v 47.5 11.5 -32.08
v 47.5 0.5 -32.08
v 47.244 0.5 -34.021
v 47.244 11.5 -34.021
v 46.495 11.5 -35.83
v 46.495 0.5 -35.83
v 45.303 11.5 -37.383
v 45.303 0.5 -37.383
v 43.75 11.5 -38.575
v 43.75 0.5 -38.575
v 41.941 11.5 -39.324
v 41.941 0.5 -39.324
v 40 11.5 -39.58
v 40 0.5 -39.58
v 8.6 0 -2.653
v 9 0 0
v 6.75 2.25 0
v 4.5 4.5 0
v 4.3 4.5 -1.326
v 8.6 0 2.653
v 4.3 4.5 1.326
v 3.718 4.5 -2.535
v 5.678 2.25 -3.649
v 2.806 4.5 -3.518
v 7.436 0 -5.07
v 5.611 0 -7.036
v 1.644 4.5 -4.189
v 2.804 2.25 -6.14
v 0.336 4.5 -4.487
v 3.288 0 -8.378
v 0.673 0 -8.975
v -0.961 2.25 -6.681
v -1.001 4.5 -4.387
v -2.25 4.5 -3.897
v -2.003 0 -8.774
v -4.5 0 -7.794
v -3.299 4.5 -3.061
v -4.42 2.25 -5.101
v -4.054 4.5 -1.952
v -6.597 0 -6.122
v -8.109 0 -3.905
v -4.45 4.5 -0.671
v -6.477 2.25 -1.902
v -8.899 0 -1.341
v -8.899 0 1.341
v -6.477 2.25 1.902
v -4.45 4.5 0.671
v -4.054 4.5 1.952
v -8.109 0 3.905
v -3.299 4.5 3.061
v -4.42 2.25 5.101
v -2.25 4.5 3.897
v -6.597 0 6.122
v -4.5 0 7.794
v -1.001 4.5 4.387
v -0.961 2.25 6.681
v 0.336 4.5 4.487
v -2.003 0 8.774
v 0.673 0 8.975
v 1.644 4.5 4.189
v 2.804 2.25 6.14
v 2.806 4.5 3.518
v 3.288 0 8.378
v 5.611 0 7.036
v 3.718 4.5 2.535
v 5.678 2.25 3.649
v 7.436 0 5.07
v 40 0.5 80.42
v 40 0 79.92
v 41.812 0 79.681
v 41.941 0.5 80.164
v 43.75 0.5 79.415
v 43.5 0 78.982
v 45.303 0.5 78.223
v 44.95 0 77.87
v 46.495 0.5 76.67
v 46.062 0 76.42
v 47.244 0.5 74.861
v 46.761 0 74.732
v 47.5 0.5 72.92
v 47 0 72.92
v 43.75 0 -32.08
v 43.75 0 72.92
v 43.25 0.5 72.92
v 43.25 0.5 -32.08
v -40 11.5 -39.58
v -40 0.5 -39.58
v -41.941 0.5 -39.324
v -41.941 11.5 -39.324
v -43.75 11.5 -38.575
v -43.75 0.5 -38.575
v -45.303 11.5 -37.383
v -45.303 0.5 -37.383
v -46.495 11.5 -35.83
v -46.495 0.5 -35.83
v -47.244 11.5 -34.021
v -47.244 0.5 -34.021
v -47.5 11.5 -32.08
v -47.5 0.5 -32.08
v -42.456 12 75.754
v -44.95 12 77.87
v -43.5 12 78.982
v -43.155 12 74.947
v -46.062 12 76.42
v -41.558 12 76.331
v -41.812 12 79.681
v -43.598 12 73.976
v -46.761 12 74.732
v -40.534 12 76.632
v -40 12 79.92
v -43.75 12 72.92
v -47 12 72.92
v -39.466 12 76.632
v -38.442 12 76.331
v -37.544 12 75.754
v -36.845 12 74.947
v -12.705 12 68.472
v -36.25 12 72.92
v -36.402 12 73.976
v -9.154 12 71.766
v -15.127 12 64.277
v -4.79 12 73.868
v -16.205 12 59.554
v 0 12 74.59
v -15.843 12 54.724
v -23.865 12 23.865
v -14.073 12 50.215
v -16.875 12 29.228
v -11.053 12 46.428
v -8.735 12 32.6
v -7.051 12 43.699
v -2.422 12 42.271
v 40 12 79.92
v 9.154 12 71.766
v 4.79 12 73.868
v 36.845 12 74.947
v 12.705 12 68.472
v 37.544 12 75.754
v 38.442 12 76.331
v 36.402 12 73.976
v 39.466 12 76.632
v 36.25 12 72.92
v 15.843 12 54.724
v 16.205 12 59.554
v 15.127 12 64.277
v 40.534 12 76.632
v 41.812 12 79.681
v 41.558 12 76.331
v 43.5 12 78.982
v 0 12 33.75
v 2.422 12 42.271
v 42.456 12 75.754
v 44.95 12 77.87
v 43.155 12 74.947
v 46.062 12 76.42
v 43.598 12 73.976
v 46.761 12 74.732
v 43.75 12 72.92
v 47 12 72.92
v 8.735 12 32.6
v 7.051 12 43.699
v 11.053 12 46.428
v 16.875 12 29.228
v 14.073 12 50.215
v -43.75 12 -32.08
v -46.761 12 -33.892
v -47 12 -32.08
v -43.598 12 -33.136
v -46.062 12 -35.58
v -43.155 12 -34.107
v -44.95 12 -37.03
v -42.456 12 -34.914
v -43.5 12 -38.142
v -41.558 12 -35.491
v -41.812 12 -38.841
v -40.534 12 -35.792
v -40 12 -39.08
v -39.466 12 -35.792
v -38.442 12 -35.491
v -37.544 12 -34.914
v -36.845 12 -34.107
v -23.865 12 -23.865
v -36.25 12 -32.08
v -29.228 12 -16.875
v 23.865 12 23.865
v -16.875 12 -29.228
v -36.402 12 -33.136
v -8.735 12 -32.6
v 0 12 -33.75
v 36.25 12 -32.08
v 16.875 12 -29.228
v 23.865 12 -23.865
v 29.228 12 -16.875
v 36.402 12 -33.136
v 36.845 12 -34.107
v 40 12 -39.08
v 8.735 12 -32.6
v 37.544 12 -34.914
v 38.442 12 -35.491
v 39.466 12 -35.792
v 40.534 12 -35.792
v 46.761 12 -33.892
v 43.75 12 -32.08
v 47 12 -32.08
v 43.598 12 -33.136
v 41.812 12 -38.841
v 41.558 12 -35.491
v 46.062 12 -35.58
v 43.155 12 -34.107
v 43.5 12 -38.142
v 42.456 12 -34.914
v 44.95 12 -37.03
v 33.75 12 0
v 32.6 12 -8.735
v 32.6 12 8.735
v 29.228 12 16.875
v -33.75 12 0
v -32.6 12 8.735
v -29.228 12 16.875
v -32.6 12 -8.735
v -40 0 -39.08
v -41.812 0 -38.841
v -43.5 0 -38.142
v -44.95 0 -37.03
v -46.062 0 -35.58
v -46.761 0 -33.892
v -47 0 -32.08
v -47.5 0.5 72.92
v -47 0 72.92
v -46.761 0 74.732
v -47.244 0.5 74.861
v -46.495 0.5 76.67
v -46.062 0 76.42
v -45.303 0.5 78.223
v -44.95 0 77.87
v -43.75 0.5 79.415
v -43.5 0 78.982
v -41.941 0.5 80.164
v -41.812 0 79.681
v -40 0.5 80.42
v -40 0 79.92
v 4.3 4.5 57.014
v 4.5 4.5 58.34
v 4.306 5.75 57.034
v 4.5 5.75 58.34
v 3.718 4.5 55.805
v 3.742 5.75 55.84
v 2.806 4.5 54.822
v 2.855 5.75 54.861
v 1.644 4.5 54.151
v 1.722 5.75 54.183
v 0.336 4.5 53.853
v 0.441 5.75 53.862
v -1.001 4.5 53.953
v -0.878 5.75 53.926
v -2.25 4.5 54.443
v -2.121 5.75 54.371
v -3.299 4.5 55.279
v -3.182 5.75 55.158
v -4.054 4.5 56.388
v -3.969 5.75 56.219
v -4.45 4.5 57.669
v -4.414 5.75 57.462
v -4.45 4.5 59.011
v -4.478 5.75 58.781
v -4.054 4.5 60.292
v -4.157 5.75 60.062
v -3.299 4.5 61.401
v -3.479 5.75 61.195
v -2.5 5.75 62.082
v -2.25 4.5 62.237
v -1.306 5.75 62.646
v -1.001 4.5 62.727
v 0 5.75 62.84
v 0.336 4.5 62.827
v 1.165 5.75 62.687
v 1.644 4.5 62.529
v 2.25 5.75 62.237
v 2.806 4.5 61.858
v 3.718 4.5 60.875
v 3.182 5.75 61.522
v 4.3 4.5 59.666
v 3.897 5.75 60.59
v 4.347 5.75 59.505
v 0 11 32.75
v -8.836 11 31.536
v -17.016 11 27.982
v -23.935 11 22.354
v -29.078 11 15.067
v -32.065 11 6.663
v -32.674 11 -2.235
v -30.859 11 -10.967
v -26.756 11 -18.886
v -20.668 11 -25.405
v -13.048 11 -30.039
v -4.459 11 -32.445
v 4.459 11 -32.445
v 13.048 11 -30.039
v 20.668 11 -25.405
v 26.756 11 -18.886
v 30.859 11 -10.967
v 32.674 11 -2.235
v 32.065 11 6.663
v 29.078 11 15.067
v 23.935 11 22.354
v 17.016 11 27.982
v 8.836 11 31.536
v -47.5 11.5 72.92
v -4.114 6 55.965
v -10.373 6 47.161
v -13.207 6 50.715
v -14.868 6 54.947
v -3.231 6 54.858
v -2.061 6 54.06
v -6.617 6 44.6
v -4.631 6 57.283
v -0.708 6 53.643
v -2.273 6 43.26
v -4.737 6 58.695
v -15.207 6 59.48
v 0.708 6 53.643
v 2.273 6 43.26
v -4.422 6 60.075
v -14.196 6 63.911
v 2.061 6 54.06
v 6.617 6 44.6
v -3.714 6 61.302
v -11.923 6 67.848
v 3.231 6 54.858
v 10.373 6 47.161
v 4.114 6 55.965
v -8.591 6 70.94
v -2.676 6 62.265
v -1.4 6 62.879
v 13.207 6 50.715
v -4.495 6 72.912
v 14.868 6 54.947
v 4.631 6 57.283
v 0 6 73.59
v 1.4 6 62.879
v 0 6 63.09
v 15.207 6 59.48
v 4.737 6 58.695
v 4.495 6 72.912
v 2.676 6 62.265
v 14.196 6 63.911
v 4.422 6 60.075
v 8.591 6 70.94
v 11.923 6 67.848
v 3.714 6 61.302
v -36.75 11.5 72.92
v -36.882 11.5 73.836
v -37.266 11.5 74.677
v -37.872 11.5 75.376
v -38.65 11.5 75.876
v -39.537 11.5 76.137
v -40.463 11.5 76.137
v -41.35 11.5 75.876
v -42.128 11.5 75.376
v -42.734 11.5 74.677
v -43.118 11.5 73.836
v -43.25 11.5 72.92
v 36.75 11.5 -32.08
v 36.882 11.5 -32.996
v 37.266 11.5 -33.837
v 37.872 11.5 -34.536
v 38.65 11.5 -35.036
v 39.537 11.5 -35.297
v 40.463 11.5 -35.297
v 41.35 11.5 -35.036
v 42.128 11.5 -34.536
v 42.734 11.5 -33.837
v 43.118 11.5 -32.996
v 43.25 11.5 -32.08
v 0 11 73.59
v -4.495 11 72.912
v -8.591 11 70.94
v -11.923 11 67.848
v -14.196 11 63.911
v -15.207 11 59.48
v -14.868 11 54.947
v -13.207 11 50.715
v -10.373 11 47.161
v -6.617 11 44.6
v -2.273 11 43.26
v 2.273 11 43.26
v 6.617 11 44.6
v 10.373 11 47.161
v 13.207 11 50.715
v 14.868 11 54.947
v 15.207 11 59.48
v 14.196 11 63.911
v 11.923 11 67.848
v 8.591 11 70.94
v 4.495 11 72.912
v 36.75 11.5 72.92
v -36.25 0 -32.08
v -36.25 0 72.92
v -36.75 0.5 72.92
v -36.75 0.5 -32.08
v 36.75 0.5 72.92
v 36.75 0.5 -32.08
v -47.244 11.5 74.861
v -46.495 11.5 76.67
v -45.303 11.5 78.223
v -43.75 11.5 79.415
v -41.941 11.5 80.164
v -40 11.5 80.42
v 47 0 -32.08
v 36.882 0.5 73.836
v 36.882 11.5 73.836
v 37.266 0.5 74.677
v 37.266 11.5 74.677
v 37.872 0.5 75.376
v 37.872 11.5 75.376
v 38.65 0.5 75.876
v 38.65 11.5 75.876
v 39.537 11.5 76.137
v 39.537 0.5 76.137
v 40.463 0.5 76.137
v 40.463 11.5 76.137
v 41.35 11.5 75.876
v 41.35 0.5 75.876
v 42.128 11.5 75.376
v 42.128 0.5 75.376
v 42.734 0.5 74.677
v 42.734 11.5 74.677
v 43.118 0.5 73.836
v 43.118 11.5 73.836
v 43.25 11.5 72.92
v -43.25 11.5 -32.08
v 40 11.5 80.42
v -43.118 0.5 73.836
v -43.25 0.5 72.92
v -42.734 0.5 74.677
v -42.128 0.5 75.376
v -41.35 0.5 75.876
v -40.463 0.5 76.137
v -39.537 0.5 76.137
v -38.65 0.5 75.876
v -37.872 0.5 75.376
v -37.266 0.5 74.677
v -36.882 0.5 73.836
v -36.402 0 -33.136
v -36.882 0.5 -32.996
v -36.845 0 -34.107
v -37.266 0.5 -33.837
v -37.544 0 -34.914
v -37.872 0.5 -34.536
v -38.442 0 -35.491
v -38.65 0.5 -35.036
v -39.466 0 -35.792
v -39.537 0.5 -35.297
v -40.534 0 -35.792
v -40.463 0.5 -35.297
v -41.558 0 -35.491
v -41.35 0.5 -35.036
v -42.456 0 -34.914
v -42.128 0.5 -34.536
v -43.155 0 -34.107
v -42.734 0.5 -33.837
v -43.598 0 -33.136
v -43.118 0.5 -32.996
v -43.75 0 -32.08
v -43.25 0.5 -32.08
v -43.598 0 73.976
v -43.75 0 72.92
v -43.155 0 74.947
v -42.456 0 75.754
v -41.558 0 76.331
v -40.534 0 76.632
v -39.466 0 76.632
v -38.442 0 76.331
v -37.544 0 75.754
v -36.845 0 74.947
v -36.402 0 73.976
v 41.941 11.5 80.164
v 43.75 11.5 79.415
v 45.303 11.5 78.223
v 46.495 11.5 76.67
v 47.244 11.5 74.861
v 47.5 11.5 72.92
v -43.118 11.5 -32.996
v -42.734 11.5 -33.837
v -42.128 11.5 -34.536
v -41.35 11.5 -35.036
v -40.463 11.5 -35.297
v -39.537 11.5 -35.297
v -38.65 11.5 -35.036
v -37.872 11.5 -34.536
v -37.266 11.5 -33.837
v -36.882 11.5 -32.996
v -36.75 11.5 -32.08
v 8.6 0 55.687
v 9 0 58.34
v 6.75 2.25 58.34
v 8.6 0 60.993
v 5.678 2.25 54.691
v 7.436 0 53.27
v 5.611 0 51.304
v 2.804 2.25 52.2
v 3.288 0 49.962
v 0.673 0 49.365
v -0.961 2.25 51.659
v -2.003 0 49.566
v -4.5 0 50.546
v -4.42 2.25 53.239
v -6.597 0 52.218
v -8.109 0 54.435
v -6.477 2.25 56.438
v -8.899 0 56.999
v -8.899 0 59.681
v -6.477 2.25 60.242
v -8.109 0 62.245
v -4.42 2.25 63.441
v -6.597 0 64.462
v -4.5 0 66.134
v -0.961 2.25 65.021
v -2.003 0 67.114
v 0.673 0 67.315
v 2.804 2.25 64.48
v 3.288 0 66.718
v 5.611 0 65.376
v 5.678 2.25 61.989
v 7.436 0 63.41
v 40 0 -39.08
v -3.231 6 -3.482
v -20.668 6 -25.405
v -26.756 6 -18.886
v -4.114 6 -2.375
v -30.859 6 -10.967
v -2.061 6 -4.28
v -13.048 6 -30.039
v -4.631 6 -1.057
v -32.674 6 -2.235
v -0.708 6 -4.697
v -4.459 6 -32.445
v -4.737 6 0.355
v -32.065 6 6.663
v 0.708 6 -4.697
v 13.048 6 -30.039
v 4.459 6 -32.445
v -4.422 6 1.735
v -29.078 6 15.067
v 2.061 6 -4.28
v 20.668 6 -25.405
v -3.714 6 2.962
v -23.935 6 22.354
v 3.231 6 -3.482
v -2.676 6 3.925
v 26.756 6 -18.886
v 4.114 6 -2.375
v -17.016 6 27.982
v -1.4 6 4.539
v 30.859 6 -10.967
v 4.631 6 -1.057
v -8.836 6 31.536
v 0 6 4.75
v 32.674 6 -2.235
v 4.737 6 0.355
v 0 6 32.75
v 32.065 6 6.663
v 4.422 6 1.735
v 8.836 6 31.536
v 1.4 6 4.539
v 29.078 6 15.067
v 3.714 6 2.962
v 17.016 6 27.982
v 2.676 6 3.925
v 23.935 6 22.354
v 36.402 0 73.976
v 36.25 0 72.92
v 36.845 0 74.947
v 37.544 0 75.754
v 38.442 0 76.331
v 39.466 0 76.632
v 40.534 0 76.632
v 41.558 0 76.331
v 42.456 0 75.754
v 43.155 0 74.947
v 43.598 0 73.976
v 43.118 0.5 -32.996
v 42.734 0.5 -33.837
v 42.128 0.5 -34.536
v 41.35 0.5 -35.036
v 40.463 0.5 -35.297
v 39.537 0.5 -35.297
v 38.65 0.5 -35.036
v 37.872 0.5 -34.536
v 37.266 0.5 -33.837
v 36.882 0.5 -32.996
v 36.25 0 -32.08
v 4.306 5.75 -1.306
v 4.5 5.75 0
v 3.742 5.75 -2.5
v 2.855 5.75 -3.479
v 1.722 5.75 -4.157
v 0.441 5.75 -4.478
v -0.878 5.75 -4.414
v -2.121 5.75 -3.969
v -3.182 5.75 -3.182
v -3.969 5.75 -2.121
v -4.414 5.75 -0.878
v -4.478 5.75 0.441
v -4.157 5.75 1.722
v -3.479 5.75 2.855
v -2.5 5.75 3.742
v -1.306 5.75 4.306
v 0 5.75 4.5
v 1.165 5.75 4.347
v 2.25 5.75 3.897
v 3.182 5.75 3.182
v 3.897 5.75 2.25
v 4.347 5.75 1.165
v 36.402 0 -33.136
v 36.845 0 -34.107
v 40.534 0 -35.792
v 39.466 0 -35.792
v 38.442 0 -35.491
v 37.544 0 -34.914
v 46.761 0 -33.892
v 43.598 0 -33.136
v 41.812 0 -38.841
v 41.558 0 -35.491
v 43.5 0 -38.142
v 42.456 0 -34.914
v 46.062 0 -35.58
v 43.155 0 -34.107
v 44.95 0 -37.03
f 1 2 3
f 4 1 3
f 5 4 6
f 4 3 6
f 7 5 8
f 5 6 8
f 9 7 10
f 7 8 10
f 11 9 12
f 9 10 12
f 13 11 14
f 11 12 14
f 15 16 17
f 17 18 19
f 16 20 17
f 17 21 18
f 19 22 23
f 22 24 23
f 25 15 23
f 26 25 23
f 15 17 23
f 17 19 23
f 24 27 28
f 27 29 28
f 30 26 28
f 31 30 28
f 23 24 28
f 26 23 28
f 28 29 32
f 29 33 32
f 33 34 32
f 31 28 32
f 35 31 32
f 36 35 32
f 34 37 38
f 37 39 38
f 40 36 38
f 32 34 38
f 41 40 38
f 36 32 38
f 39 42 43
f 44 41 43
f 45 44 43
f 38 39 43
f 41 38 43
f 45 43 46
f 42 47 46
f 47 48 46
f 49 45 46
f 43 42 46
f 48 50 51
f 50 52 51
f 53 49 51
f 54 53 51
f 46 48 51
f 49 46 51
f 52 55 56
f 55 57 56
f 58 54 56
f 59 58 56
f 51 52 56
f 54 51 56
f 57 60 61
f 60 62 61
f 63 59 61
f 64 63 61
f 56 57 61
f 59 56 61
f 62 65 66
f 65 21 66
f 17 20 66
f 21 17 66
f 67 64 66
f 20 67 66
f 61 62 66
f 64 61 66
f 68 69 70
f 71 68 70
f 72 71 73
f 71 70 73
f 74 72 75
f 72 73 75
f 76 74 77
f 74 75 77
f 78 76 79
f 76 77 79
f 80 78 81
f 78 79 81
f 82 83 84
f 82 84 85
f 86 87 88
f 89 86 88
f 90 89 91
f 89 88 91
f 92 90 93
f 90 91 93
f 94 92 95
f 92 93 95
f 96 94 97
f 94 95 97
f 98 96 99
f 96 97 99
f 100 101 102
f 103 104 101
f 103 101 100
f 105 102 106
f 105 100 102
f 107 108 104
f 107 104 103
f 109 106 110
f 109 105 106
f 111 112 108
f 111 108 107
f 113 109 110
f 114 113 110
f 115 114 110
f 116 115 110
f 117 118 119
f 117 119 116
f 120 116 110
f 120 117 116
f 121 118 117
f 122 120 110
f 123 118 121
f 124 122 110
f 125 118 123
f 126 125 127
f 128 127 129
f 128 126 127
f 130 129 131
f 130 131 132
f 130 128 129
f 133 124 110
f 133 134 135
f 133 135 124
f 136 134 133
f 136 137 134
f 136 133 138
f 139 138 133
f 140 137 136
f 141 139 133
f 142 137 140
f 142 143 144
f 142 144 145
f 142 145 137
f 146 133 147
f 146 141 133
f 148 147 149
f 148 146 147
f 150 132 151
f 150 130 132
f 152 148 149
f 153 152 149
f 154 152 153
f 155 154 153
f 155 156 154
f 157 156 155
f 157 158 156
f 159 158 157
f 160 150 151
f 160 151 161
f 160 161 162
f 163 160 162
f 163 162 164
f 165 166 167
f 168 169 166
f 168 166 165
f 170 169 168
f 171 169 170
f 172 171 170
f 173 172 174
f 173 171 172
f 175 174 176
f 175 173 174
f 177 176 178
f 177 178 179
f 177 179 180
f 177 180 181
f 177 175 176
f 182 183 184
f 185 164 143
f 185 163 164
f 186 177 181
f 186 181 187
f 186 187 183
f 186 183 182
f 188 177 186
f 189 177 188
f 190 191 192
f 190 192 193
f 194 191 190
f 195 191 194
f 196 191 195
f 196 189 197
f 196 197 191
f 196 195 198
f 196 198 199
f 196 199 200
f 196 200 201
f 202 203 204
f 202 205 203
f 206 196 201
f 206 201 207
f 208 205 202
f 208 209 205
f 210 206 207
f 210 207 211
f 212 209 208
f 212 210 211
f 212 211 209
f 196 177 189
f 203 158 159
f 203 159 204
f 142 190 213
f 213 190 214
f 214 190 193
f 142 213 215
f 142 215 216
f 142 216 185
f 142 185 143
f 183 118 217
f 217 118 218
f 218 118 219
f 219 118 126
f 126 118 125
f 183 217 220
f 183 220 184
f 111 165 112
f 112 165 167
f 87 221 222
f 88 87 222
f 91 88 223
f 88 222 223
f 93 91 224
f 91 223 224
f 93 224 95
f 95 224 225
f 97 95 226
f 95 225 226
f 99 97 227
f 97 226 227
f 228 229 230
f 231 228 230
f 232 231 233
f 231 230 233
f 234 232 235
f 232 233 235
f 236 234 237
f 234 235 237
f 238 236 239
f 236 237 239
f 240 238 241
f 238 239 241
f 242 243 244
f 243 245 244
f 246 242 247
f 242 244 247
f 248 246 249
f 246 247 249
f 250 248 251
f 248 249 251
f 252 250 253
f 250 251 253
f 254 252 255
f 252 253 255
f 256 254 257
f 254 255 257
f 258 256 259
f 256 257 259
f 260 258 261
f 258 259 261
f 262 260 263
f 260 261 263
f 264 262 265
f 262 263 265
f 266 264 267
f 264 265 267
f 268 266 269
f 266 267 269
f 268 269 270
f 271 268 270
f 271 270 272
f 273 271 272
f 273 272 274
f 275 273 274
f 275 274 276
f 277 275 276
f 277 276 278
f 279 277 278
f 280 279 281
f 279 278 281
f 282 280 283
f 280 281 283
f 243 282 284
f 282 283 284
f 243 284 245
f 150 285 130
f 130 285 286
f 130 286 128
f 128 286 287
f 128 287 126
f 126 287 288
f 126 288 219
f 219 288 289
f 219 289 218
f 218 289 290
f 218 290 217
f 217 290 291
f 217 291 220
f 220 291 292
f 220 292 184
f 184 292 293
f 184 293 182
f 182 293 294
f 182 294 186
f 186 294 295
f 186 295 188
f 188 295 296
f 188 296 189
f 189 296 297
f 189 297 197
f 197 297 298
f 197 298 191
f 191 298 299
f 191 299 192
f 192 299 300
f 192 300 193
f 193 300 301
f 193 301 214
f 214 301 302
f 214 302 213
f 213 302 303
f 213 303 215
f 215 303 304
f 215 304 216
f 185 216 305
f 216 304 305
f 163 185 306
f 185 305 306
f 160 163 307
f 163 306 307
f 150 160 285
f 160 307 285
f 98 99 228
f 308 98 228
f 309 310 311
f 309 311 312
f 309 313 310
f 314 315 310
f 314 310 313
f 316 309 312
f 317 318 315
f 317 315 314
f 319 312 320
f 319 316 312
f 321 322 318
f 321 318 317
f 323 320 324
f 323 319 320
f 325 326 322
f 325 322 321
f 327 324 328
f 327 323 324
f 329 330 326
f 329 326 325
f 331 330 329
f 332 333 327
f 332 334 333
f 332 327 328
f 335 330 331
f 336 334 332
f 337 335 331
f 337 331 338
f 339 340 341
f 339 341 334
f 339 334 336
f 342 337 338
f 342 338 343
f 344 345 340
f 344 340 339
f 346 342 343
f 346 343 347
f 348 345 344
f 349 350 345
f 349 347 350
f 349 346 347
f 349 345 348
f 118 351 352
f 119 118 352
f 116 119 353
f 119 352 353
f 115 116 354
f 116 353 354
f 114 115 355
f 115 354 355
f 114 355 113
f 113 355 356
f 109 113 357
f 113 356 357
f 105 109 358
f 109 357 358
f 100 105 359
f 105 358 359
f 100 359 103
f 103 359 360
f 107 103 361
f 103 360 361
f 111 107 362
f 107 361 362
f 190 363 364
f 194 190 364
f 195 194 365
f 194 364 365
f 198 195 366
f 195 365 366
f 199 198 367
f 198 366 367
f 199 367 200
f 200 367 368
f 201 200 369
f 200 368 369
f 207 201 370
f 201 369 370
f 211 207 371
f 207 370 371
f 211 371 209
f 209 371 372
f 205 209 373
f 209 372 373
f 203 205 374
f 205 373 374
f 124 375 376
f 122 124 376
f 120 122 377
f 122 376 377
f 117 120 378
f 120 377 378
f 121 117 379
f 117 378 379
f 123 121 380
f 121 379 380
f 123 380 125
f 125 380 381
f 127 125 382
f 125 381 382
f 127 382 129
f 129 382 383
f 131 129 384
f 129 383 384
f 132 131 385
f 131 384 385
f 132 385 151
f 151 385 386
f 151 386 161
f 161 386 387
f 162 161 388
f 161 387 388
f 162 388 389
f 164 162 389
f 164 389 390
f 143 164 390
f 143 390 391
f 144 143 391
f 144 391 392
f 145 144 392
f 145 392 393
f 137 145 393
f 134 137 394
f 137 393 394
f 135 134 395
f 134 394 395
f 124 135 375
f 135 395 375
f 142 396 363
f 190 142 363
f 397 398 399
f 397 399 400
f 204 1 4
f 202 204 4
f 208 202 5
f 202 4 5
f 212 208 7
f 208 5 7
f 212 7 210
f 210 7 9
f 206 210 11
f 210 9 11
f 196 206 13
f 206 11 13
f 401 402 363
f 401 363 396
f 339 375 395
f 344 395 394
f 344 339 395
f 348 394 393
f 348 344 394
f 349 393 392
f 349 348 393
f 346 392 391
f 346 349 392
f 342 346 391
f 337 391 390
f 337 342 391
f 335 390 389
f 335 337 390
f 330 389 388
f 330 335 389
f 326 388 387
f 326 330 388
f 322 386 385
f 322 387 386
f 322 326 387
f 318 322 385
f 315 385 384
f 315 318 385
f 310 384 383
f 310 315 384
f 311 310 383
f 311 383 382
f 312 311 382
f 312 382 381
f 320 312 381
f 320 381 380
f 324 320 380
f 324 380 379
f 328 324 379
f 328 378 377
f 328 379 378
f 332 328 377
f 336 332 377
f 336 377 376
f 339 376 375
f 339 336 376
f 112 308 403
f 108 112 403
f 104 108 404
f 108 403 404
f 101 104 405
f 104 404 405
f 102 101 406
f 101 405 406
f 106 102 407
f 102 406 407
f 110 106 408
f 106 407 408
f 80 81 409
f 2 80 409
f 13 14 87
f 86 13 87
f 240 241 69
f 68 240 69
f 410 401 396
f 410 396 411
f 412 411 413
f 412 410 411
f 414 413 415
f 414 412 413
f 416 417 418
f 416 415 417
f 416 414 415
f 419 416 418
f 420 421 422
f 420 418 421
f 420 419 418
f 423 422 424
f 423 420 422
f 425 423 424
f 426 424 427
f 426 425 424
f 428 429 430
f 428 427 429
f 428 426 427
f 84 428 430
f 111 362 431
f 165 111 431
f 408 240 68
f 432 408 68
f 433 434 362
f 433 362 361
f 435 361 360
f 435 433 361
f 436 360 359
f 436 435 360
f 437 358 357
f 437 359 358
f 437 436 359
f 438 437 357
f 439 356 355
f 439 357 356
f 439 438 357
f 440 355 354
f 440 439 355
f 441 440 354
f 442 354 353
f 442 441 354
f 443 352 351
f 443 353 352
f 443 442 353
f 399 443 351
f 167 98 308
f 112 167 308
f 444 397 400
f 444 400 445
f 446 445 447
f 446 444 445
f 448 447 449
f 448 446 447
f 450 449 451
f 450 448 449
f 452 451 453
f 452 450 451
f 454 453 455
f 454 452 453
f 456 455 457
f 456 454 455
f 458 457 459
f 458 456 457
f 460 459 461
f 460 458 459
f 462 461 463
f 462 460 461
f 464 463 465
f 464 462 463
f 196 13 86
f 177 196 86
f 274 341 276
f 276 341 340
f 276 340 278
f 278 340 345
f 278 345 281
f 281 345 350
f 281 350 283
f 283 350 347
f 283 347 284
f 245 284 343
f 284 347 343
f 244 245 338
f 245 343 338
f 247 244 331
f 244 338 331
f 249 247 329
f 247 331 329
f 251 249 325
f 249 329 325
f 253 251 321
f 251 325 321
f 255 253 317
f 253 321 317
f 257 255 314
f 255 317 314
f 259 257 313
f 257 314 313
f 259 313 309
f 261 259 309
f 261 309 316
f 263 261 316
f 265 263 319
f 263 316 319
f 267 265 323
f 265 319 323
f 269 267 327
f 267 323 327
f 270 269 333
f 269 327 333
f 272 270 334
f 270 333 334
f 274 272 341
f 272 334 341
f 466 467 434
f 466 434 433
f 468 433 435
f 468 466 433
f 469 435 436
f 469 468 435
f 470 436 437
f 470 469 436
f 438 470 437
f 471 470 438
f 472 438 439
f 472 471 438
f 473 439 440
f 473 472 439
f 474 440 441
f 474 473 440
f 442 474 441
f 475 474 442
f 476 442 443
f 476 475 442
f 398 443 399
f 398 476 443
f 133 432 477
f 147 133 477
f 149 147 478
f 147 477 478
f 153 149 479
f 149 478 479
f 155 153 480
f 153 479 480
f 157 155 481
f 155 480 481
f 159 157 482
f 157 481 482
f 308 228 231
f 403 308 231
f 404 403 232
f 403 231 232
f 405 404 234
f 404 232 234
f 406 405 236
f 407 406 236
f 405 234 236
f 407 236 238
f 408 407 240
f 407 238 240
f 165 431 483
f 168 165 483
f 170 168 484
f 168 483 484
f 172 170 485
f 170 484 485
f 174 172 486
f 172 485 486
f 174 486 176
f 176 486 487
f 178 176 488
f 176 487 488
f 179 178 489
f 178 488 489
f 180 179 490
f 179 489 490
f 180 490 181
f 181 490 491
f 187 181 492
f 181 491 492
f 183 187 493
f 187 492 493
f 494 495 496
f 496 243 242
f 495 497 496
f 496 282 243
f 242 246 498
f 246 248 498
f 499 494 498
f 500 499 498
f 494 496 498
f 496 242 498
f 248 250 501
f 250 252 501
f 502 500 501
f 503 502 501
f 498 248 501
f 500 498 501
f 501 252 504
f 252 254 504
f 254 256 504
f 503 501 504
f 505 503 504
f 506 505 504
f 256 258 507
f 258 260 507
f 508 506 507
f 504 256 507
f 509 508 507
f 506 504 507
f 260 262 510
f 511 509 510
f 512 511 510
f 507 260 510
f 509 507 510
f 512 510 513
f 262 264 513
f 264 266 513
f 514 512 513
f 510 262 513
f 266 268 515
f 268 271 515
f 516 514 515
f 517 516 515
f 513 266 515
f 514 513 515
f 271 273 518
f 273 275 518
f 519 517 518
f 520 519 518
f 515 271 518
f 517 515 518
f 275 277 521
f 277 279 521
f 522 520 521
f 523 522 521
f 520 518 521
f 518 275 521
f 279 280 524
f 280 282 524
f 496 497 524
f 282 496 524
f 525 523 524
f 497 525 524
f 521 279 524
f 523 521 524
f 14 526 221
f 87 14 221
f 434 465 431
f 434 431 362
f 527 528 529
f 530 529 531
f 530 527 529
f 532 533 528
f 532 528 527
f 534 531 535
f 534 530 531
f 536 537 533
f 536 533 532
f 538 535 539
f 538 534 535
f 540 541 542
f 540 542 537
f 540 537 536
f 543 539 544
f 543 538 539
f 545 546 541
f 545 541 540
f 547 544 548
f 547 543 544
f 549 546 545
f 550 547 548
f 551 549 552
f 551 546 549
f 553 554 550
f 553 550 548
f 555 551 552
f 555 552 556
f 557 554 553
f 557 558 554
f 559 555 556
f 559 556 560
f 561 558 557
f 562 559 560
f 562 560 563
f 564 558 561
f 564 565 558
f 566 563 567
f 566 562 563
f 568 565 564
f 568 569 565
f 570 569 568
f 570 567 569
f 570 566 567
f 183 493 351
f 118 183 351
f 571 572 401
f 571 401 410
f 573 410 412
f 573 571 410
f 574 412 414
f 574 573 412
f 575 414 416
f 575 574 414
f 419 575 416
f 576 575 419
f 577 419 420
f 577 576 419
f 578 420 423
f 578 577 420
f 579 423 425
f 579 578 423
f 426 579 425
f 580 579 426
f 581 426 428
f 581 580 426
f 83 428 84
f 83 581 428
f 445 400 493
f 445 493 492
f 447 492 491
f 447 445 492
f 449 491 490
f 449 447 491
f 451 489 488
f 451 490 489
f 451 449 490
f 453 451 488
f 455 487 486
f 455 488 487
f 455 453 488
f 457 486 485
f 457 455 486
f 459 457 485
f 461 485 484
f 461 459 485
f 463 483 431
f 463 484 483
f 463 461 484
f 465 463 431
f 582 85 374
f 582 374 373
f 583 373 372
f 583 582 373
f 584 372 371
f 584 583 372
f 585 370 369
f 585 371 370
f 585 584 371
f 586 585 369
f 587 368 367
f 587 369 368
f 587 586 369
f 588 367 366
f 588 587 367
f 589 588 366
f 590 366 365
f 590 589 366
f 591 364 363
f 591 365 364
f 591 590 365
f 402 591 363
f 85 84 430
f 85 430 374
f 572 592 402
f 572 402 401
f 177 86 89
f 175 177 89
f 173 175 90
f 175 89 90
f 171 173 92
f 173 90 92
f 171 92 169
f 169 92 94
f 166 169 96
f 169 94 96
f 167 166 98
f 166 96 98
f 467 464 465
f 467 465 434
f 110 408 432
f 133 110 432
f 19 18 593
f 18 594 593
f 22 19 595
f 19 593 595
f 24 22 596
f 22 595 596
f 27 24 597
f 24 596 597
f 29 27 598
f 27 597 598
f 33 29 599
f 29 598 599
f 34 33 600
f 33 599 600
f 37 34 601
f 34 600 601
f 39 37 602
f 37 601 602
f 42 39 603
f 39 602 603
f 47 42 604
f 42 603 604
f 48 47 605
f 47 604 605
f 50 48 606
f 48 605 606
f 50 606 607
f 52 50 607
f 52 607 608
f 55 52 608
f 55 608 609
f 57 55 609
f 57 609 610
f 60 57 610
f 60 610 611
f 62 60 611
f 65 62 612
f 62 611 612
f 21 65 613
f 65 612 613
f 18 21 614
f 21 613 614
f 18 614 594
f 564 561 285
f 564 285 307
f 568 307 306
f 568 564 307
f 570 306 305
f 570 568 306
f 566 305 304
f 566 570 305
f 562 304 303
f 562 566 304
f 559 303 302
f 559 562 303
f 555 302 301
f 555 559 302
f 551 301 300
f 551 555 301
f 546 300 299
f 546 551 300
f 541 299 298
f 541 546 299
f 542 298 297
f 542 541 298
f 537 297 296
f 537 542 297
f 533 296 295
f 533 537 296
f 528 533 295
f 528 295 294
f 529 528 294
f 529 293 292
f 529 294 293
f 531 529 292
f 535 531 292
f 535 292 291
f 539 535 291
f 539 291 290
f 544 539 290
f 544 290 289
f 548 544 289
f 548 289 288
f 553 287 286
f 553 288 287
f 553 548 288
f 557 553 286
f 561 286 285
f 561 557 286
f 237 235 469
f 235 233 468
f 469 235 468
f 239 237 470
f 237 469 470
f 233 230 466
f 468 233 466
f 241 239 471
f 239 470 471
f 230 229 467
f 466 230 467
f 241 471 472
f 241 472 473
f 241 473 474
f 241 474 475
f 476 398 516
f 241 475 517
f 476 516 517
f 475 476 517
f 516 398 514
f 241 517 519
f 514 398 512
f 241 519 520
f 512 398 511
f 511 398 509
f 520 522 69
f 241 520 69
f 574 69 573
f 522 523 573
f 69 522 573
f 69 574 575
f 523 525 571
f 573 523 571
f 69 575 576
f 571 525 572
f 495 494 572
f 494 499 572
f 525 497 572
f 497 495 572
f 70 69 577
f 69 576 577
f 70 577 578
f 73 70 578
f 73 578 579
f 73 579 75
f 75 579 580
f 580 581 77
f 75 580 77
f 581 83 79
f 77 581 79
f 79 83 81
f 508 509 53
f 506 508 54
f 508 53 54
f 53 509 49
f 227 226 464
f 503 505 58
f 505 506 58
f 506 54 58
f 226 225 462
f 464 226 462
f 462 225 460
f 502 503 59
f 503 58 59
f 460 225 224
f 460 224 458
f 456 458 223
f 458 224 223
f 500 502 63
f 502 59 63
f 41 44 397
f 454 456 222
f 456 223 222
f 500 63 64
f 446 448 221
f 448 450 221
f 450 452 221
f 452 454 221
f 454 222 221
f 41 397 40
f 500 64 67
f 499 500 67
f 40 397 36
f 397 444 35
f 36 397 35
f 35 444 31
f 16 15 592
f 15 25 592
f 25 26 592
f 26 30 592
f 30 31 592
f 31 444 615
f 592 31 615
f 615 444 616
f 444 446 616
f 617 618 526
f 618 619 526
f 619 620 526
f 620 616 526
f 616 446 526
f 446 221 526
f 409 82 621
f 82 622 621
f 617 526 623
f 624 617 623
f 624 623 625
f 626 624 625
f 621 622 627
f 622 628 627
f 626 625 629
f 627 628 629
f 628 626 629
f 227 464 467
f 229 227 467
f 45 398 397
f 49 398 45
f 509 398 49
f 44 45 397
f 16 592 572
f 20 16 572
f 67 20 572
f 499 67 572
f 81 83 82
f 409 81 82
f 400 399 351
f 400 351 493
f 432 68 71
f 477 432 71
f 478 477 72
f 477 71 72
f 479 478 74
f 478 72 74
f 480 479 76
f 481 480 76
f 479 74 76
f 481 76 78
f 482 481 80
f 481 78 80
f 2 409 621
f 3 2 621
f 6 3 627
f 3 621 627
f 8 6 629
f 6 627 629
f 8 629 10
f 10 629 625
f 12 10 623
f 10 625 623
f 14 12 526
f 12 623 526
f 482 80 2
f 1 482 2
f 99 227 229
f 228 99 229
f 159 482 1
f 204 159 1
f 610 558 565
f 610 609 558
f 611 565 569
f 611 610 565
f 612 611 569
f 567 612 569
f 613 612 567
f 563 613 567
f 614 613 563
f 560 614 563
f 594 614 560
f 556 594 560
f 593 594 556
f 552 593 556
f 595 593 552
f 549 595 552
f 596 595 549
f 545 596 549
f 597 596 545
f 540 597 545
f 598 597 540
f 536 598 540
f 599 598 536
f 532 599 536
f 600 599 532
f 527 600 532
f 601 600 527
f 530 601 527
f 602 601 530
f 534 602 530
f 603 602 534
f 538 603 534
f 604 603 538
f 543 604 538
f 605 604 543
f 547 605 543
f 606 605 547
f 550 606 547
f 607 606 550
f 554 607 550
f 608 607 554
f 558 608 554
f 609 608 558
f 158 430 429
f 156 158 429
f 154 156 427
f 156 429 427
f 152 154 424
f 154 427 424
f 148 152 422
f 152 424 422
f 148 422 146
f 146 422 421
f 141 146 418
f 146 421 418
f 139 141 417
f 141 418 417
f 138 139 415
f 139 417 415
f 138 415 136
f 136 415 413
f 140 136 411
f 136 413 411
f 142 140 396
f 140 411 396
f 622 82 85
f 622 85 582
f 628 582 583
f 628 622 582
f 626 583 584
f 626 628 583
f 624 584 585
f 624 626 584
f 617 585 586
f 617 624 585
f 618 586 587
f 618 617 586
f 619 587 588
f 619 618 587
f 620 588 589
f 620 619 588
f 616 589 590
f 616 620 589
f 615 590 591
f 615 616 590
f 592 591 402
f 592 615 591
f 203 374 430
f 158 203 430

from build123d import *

# Parameters (mm, degrees)
BOSS_EXTRUDE1_DEPTH                             = 12
SKETCH1_4_R                                     = 4.25
CUT_EXTRUDE2_DEPTH                              = 95.16807527
CUT_EXTRUDE3_START                              = 6
SKETCH1_6_R                                     = 32.75
SKETCH1_6_R_2                                   = 4.25
SKETCH1_6_R_3                                   = 15.25
CUT_EXTRUDE3_DEPTH                              = 89.16807527
CHAMFER1_SIZE                                   = 1
CHAMFER2_SIZE                                   = 0.5
CSK_FOR_M8_FLAT_HEAD_MACHINE_SCREW1_D           = 9
CSK_FOR_M8_FLAT_HEAD_MACHINE_SCREW1_CSINK_D     = 18
CSK_FOR_M8_FLAT_HEAD_MACHINE_SCREW1_CSINK_ANGLE = 90


with BuildPart() as part:
    # Sketch1 → Boss-Extrude1 (new body)
    with BuildSketch(Plane(origin=(0, 0, 0), x_dir=(1, 0, 0), z_dir=(0, 1, 0))):
        with BuildLine():
            ThreePointArc((-47.5, -72.92), (-45.303300859, -78.223300859), (-40, -80.42))
            Line((-40, -80.42), (40, -80.42))
            ThreePointArc((40, -80.42), (45.303300859, -78.223300859), (47.5, -72.92))
            Line((47.5, -72.92), (47.5, 32.08))
            ThreePointArc((47.5, 32.08), (45.303300859, 37.383300859), (40, 39.58))
            Line((40, 39.58), (-40, 39.58))
            ThreePointArc((-40, 39.58), (-45.303300859, 37.383300859), (-47.5, 32.08))
            Line((-47.5, 32.08), (-47.5, -72.92))
        make_face()
    extrude(amount=BOSS_EXTRUDE1_DEPTH)

    # Sketch1<4> → Cut-Extrude2 (cut, through all)
    with BuildSketch(Plane(origin=(0, 0, 0), x_dir=(1, 0, 0), z_dir=(0, 1, 0))):
        with BuildLine():
            Line((-36.75, -72.92), (-36.75, 32.08))
            ThreePointArc((-36.75, 32.08), (-40, 35.33), (-43.25, 32.08))
            Line((-43.25, 32.08), (-43.25, -72.92))
            ThreePointArc((-43.25, -72.92), (-40, -76.17), (-36.75, -72.92))
        make_face()
        with BuildLine():
            Line((43.25, -72.92), (43.25, 32.08))
            ThreePointArc((43.25, 32.08), (40, 35.33), (36.75, 32.08))
            Line((36.75, 32.08), (36.75, -72.92))
            ThreePointArc((36.75, -72.92), (40, -76.17), (43.25, -72.92))
        make_face()
        Circle(SKETCH1_4_R)
        with Locations((0, -58.34)):
            Circle(SKETCH1_4_R)
    extrude(amount=CUT_EXTRUDE2_DEPTH, mode=Mode.SUBTRACT)

    # Sketch1<6> → Cut-Extrude3 (cut, through all)
    # profile 1 of 2: a face of its own
    with BuildSketch(Plane(origin=(0, 0, 0), x_dir=(1, 0, 0), z_dir=(0, 1, 0)).offset(CUT_EXTRUDE3_START)):
        Circle(SKETCH1_6_R)
        Circle(SKETCH1_6_R_2, mode=Mode.SUBTRACT)
    # profile 2 of 2: a face of its own
    with BuildSketch(Plane(origin=(0, 0, 0), x_dir=(1, 0, 0), z_dir=(0, 1, 0)).offset(CUT_EXTRUDE3_START)):
        with Locations((0, -58.34)):
            Circle(SKETCH1_6_R_3)
        with Locations((0, -58.34)):
            Circle(SKETCH1_6_R_2, mode=Mode.SUBTRACT)
    extrude(amount=CUT_EXTRUDE3_DEPTH, mode=Mode.SUBTRACT)

    # Chamfer1
    chamfer1_edges = [part.edges().sort_by_distance(p)[0] for p in [
        (-15.25, 12, 58.34),
        (-32.75, 12, 0),
    ]]
    chamfer(chamfer1_edges, length=CHAMFER1_SIZE)

    # Chamfer2
    chamfer2_edges = [part.edges().sort_by_distance(p)[0] for p in [
        (-4.25, 6, 58.34),
        (-4.25, 0, 58.34),
        (-4.25, 6, 0),
        (-4.25, 0, 0),
        (43.25, 12, 20.42),
        (40, 12, -35.33),
        (40, 12, 76.17),
        (36.75, 12, 20.42),
        (43.25, 0, 20.42),
        (40, 0, -35.33),
        (40, 0, 76.17),
        (36.75, 0, 20.42),
        (-36.75, 12, 20.42),
        (-40, 12, -35.33),
        (-40, 12, 76.17),
        (-43.25, 12, 20.42),
        (-36.75, 0, 20.42),
        (-40, 0, -35.33),
        (-40, 0, 76.17),
        (-43.25, 0, 20.42),
        (0, 12, -39.58),
        (-45.303300859, 12, -37.383300859),
        (45.303300859, 12, -37.383300859),
        (-47.5, 12, 20.42),
        (47.5, 12, 20.42),
        (-45.303300859, 12, 78.223300859),
        (45.303300859, 12, 78.223300859),
        (0, 12, 80.42),
        (0, 0, -39.58),
        (-45.303300859, 0, -37.383300859),
        (45.303300859, 0, -37.383300859),
        (-47.5, 0, 20.42),
        (47.5, 0, 20.42),
        (-45.303300859, 0, 78.223300859),
        (45.303300859, 0, 78.223300859),
        (0, 0, 80.42),
    ]]
    chamfer(chamfer2_edges, length=CHAMFER2_SIZE)

    # CSK for M8 Flat Head Machine Screw1 (through all)
    with Locations(Plane(origin=(0, 0, 0), x_dir=(-1, 0, 0), z_dir=(0, -1, 0))):
        with Locations((0, 0), (0, -58.34)):
            CounterSinkHole(CSK_FOR_M8_FLAT_HEAD_MACHINE_SCREW1_D / 2, CSK_FOR_M8_FLAT_HEAD_MACHINE_SCREW1_CSINK_D / 2, counter_sink_angle=CSK_FOR_M8_FLAT_HEAD_MACHINE_SCREW1_CSINK_ANGLE)


solid = part.part
